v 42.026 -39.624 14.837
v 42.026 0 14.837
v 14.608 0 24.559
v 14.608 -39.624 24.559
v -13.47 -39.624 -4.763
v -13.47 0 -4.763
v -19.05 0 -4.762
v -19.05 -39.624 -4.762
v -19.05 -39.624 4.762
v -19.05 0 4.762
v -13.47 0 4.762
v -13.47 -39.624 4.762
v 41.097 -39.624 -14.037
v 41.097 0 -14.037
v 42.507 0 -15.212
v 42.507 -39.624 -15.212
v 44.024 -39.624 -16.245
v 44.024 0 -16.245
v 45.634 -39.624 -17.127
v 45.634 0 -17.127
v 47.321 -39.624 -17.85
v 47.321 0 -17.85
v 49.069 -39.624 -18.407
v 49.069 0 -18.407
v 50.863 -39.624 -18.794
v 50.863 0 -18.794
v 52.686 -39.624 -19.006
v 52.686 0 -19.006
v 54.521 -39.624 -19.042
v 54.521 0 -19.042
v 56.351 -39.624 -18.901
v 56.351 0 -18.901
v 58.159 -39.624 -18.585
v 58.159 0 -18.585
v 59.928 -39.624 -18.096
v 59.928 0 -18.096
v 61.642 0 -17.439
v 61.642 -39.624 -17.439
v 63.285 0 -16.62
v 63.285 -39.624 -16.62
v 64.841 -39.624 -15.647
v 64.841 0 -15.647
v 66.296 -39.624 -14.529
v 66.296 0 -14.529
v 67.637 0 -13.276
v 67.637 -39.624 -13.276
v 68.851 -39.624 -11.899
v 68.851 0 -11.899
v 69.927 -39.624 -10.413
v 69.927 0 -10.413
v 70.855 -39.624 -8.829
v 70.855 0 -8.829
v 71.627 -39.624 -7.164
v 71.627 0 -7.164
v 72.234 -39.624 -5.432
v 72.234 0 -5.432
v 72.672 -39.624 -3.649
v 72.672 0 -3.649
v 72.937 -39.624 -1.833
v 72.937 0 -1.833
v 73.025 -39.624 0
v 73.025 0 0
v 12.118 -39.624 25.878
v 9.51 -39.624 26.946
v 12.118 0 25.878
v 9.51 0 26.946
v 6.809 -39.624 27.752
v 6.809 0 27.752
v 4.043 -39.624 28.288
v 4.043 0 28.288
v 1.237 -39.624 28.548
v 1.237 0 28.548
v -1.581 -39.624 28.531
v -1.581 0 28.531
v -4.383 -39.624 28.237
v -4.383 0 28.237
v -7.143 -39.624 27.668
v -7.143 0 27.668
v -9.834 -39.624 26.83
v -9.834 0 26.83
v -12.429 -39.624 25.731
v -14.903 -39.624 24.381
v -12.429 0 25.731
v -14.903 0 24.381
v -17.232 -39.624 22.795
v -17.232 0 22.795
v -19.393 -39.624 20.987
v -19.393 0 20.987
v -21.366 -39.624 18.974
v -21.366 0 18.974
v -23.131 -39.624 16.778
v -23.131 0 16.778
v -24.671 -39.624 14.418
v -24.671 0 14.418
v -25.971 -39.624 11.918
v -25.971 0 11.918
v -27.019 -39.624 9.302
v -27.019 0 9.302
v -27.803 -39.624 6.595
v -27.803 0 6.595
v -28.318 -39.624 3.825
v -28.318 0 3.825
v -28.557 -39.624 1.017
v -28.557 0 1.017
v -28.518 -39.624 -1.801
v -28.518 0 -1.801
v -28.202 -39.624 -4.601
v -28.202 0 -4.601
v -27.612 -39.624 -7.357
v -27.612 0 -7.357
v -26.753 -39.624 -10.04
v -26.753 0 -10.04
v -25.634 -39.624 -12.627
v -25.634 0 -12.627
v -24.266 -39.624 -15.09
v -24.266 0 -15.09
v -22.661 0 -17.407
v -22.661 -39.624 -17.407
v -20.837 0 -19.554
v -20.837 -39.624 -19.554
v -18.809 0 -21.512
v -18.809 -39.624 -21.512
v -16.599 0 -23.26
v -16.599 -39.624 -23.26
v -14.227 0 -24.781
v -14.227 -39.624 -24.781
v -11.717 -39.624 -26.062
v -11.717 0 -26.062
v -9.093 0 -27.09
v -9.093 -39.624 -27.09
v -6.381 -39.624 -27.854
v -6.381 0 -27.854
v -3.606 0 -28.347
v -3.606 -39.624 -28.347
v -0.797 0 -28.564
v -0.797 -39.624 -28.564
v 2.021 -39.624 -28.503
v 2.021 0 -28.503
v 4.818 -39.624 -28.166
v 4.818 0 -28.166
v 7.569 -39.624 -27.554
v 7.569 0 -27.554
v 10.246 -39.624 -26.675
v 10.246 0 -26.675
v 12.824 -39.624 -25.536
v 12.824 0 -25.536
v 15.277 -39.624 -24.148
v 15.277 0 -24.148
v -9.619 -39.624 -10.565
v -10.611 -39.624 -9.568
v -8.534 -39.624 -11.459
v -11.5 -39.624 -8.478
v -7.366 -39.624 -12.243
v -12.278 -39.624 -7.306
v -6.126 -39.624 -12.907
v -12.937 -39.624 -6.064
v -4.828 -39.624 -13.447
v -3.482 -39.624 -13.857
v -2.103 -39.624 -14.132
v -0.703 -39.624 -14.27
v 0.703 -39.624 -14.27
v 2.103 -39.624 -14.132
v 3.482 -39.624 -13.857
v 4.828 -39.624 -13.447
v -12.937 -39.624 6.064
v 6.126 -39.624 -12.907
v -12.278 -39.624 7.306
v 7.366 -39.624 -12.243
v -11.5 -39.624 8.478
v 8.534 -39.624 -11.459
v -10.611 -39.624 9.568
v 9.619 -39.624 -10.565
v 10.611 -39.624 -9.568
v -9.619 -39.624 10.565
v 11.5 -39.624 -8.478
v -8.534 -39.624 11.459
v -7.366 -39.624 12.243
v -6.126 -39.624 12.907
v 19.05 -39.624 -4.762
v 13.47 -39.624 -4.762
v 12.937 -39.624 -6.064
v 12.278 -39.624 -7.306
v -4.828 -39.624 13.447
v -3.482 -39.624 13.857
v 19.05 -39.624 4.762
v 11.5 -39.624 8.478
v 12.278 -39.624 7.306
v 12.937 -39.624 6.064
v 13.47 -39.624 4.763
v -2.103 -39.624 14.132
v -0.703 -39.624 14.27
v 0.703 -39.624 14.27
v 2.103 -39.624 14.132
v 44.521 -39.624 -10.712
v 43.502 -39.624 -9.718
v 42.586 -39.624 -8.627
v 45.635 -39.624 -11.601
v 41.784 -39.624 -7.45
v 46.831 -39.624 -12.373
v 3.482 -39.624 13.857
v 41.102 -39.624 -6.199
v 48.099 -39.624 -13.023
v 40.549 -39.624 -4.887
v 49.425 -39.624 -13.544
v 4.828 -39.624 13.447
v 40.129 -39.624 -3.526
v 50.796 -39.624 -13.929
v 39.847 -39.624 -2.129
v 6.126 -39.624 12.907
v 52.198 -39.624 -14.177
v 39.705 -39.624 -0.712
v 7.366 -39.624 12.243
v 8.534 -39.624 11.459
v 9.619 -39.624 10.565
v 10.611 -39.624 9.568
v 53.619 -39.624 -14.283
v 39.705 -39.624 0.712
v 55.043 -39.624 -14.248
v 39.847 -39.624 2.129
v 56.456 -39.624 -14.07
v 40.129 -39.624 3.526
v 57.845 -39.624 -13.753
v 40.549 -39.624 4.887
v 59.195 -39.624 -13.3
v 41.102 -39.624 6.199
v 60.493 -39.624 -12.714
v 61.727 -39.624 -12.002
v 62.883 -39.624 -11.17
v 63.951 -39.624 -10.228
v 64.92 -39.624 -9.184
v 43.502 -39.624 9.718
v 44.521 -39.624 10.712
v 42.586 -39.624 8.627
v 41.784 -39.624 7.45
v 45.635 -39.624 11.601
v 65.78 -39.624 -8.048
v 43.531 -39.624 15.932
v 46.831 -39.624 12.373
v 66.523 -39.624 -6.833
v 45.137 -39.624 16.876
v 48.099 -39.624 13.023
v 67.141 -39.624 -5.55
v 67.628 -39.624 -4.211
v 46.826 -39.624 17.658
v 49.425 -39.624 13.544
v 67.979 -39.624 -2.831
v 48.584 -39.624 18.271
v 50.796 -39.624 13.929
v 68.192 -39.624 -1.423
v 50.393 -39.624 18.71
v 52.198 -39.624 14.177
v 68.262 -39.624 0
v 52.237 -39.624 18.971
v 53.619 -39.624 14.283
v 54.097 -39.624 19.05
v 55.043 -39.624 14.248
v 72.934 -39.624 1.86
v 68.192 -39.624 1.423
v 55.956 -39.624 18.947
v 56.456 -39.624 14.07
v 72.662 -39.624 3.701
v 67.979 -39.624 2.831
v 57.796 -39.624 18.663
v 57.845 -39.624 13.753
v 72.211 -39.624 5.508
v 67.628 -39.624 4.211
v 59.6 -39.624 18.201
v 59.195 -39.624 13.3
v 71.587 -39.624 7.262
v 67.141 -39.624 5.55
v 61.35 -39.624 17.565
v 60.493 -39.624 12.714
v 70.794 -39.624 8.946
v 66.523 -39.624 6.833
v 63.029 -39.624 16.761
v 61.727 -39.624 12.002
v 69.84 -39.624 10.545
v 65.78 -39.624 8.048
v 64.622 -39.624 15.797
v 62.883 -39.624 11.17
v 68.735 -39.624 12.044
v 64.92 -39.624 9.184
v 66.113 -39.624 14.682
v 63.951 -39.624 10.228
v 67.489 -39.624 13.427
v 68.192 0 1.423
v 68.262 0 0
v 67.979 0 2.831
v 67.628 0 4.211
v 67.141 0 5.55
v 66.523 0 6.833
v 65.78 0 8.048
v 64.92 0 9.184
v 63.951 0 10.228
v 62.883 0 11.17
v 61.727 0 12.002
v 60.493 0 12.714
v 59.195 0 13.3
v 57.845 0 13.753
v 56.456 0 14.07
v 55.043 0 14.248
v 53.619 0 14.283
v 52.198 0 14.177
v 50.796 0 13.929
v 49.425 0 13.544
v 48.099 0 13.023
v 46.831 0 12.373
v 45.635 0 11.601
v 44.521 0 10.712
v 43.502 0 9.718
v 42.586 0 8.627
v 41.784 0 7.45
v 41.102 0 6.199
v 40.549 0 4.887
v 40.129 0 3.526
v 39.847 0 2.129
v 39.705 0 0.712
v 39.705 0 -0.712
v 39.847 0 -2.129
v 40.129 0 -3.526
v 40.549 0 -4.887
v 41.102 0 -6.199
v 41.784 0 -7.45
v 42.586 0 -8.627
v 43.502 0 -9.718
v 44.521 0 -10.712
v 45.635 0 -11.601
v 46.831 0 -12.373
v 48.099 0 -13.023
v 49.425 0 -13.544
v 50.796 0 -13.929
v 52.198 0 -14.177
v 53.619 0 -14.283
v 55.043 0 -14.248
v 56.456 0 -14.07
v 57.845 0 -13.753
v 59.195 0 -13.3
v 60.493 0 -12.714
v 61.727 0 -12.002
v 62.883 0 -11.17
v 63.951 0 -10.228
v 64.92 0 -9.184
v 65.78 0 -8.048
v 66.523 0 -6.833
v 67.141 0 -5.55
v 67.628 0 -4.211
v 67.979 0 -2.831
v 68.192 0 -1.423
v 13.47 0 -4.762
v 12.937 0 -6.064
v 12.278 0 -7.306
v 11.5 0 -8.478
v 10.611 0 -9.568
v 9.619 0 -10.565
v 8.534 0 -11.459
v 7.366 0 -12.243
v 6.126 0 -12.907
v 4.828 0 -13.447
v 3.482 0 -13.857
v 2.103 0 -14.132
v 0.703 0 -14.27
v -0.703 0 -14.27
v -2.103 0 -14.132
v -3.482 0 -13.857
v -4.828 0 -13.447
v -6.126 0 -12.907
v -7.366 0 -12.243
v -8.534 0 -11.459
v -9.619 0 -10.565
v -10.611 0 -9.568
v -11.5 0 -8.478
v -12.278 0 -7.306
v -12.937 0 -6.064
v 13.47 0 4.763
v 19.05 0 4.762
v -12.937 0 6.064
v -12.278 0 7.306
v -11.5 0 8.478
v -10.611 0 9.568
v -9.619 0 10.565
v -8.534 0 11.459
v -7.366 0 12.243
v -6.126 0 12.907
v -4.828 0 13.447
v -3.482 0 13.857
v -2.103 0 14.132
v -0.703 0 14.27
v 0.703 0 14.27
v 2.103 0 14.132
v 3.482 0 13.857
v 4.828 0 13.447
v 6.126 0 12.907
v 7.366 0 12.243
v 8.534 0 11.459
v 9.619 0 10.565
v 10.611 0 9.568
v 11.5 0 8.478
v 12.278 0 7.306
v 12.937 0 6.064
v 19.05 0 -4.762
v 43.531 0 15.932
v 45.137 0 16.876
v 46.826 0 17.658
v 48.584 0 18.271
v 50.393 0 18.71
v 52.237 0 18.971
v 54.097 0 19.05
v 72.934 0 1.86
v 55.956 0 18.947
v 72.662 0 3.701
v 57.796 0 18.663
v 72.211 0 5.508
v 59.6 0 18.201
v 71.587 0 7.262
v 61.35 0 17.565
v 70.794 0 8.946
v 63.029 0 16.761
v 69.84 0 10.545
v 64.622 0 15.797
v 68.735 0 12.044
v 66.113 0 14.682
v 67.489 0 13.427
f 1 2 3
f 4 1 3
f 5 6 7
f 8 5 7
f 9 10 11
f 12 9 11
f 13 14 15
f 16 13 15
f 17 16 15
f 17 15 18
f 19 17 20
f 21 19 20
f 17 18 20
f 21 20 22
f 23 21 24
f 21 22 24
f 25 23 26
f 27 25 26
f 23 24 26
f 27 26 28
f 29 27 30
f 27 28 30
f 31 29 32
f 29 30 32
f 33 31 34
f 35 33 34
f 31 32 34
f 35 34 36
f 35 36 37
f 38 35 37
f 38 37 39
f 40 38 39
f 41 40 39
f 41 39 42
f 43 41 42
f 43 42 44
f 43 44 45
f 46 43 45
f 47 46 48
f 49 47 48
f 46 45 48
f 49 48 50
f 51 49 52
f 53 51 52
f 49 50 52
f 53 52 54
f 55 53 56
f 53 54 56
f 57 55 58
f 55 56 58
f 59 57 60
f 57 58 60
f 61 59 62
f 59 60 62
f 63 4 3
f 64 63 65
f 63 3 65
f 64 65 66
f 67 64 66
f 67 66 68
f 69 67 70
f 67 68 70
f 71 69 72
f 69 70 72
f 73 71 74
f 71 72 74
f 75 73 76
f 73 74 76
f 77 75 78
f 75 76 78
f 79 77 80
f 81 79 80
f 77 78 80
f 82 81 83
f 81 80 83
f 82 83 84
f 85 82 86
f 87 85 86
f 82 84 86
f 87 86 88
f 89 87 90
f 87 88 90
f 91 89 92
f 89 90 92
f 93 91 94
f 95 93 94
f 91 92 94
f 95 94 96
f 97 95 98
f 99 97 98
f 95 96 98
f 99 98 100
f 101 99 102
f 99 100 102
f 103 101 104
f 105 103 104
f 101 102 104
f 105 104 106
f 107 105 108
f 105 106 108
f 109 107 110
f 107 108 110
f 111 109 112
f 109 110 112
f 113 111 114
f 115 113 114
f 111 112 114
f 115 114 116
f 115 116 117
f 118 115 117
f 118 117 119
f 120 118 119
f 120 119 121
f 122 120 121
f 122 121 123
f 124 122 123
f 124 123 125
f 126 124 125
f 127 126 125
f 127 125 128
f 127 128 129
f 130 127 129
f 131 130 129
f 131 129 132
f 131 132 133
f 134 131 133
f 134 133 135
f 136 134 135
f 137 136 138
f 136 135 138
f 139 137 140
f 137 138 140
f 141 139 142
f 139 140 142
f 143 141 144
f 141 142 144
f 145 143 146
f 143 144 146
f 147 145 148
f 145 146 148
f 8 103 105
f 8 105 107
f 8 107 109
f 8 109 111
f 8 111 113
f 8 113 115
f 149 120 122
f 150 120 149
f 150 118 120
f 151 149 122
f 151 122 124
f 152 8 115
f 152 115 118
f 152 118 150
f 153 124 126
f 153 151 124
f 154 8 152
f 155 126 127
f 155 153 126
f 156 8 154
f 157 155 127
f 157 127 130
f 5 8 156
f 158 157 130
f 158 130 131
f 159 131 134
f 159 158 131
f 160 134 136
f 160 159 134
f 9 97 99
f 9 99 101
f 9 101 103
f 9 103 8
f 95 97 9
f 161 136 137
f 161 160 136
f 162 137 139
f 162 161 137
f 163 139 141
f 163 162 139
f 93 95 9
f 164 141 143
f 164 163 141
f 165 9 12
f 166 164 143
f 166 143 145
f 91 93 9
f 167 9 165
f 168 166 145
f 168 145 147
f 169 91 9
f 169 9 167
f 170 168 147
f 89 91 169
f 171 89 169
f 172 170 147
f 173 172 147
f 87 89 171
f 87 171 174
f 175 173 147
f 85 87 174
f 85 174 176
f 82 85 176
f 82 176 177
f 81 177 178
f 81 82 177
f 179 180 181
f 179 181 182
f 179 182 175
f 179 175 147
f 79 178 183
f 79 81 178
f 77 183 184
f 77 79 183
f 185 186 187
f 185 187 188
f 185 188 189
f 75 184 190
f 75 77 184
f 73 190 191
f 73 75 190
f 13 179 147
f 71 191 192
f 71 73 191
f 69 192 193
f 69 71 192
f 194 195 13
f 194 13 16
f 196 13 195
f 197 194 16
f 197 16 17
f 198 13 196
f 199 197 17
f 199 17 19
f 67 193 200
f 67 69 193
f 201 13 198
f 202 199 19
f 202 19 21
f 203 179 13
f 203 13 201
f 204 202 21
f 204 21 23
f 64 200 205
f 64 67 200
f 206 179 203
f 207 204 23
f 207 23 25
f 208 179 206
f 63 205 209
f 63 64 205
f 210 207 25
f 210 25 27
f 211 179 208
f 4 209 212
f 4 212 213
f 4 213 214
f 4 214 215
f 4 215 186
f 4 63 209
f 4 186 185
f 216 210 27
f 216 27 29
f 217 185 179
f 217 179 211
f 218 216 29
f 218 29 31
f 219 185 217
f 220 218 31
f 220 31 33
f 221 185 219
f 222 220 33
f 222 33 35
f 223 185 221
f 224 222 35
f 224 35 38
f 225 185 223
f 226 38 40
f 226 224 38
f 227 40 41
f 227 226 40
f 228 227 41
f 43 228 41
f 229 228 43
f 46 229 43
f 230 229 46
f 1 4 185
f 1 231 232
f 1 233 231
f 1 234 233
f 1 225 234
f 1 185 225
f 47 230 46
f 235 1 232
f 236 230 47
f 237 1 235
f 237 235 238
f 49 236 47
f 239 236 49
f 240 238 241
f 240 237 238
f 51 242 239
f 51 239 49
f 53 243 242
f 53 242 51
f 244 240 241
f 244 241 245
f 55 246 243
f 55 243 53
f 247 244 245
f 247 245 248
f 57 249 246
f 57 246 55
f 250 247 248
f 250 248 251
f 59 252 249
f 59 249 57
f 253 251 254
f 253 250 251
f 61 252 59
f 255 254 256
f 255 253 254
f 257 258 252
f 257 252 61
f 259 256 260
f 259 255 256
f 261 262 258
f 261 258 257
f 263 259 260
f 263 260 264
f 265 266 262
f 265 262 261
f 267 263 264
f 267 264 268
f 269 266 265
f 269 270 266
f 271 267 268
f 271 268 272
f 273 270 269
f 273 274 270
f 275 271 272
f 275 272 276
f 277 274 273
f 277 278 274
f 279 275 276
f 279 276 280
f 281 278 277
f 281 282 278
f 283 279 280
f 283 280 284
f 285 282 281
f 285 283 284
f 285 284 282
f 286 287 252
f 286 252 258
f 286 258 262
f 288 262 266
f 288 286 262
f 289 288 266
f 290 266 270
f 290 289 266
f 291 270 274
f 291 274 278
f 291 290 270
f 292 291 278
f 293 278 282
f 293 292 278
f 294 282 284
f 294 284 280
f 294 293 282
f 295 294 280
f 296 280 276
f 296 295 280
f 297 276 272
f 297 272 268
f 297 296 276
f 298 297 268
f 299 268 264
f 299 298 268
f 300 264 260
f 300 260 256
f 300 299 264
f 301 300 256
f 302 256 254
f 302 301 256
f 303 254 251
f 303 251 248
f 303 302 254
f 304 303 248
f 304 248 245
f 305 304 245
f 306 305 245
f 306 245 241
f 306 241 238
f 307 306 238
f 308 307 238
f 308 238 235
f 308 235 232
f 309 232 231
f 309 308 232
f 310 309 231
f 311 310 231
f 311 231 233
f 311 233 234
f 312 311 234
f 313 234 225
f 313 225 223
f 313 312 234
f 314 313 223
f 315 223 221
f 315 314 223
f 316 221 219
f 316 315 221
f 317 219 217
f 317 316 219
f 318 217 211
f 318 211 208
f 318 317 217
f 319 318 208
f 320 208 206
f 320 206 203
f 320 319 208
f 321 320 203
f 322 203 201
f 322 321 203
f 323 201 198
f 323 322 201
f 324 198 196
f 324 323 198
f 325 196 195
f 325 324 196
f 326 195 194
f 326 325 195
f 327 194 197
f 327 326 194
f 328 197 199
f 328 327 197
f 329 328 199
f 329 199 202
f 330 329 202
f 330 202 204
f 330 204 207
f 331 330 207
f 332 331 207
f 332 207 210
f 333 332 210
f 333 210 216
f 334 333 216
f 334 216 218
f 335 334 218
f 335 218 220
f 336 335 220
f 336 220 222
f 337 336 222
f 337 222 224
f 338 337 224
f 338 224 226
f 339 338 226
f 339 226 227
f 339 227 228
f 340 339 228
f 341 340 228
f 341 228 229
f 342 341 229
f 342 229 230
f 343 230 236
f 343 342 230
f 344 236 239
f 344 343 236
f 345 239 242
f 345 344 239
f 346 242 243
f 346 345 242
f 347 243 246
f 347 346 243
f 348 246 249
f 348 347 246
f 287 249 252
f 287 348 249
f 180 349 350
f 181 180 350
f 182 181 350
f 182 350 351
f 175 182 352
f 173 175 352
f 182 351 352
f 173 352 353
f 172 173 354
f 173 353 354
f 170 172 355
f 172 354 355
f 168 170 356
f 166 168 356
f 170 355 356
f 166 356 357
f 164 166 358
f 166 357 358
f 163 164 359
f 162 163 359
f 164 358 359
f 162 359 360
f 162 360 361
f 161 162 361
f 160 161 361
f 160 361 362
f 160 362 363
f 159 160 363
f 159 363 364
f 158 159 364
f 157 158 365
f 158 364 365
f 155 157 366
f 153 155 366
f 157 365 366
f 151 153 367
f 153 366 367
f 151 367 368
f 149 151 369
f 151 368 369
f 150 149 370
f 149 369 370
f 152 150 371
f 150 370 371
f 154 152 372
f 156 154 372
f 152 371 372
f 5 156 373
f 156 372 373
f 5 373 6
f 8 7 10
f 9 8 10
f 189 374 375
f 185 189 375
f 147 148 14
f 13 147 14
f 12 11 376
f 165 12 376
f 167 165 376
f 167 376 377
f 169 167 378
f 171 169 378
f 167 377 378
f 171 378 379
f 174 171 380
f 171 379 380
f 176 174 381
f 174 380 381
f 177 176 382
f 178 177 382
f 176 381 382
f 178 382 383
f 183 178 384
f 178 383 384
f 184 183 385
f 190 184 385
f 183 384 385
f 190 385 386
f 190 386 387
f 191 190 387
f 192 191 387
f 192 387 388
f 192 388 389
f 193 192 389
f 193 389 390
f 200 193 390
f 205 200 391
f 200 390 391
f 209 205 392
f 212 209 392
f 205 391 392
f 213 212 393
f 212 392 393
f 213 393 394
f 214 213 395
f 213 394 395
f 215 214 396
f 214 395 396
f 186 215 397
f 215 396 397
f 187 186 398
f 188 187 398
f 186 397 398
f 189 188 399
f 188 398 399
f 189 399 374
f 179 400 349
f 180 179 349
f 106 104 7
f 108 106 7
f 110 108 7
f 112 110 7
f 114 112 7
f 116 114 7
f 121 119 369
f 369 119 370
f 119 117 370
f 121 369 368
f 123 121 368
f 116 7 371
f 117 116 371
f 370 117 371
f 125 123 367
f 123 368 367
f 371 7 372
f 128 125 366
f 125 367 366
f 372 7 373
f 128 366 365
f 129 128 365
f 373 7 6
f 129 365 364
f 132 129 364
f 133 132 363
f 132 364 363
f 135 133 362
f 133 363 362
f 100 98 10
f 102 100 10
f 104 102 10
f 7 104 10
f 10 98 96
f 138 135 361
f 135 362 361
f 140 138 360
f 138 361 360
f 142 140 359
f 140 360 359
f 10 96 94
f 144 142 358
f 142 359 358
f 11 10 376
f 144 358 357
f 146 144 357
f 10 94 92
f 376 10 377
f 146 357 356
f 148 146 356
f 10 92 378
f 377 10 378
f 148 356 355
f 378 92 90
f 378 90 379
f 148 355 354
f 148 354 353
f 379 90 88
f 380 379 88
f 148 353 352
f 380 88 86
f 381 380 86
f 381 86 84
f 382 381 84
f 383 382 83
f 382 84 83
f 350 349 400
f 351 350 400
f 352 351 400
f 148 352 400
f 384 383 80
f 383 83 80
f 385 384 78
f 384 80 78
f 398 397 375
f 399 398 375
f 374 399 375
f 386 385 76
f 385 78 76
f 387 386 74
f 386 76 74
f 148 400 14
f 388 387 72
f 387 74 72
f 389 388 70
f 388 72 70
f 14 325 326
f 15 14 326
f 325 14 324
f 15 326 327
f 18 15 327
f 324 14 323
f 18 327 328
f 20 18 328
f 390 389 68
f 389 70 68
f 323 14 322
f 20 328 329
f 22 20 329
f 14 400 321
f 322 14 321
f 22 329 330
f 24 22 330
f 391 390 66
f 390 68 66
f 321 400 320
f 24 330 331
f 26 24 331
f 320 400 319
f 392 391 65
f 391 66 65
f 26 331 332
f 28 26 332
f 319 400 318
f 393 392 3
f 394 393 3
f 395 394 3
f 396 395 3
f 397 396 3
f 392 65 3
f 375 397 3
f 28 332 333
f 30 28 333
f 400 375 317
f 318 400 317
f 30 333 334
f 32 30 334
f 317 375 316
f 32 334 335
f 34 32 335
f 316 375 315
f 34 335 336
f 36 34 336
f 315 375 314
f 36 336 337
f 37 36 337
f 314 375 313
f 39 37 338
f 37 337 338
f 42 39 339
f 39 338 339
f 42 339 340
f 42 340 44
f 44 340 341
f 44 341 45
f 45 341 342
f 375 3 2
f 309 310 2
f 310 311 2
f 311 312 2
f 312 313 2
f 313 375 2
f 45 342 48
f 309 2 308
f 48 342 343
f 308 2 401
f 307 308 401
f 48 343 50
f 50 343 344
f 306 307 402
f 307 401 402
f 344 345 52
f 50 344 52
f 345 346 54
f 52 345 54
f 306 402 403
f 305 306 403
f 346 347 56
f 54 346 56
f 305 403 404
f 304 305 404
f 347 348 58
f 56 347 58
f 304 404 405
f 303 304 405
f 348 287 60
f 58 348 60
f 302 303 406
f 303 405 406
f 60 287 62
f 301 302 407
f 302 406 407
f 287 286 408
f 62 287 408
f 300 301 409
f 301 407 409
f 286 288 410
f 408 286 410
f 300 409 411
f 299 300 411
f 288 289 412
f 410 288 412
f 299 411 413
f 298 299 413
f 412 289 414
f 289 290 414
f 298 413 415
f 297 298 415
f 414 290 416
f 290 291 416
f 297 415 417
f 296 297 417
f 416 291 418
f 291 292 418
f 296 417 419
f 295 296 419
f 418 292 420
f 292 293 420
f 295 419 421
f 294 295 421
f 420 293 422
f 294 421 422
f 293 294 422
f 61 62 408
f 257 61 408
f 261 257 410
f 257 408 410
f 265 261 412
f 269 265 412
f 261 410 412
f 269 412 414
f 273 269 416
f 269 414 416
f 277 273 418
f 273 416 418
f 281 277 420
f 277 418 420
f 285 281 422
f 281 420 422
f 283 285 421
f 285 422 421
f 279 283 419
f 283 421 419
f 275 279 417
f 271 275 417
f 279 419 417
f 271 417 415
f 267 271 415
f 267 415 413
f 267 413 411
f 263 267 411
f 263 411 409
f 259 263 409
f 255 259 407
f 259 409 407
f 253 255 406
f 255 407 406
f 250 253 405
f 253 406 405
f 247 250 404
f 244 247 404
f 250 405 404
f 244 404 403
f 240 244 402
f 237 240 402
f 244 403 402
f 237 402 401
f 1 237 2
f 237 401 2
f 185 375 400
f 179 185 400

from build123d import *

# Parameters (mm, degrees)
F0_R     = 14.2875
F1_DEPTH = 39.624


with BuildPart() as f1:
    # F0 (on Front) → F1 (new body)
    with BuildSketch(Plane.XZ):
        with BuildLine():
            ThreePointArc((73.025, 0), (62.19921, 17.183273), (42.026063, 14.836624))
            ThreePointArc((42.026063, 14.836624), (34.934863, 0.612924), (41.096574, -14.037402))
            ThreePointArc((41.096574, -14.037402), (61.642088, -17.438987), (73.025, 0))
        make_face()
        with Locations((53.975, 0)):
            Circle(F0_R, mode=Mode.SUBTRACT)
        with BuildLine():
            ThreePointArc((14.607696, 24.559028), (24.838936, 14.126495), (28.575, 0))
            ThreePointArc((28.575, 0), (25.030648, -13.783951), (15.276852, -24.148466))
            Line((15.276852, -24.148466), (41.096574, -14.037402))
            ThreePointArc((41.096574, -14.037402), (34.934863, 0.612924), (42.026063, 14.836624))
            Line((42.026063, 14.836624), (14.607696, 24.559028))
        make_face()
        with BuildLine():
            ThreePointArc((15.276852, -24.148466), (25.030648, -13.783951), (28.575, 0))
            ThreePointArc((28.575, 0), (24.838936, 14.126495), (14.607696, 24.559028))
            ThreePointArc((14.607696, 24.559028), (-28.572304, -0.392534), (15.276852, -24.148466))
        make_face()
        with BuildLine():
            ThreePointArc((-13.470384, 4.7625), (0, 14.2875), (13.470384, 4.7625))
            Line((13.470384, 4.7625), (19.05, 4.7625))
            Line((19.05, 4.7625), (19.05, -4.7625))
            Line((19.05, -4.7625), (13.470384, -4.7625))
            ThreePointArc((13.470384, -4.7625), (0, -14.2875), (-13.470384, -4.7625))
            Line((-13.470384, -4.7625), (-19.05, -4.7625))
            Line((-19.05, -4.7625), (-19.05, 4.7625))
            Line((-19.05, 4.7625), (-13.470384, 4.7625))
        make_face(mode=Mode.SUBTRACT)
    extrude(amount=F1_DEPTH)


solid = f1.part
